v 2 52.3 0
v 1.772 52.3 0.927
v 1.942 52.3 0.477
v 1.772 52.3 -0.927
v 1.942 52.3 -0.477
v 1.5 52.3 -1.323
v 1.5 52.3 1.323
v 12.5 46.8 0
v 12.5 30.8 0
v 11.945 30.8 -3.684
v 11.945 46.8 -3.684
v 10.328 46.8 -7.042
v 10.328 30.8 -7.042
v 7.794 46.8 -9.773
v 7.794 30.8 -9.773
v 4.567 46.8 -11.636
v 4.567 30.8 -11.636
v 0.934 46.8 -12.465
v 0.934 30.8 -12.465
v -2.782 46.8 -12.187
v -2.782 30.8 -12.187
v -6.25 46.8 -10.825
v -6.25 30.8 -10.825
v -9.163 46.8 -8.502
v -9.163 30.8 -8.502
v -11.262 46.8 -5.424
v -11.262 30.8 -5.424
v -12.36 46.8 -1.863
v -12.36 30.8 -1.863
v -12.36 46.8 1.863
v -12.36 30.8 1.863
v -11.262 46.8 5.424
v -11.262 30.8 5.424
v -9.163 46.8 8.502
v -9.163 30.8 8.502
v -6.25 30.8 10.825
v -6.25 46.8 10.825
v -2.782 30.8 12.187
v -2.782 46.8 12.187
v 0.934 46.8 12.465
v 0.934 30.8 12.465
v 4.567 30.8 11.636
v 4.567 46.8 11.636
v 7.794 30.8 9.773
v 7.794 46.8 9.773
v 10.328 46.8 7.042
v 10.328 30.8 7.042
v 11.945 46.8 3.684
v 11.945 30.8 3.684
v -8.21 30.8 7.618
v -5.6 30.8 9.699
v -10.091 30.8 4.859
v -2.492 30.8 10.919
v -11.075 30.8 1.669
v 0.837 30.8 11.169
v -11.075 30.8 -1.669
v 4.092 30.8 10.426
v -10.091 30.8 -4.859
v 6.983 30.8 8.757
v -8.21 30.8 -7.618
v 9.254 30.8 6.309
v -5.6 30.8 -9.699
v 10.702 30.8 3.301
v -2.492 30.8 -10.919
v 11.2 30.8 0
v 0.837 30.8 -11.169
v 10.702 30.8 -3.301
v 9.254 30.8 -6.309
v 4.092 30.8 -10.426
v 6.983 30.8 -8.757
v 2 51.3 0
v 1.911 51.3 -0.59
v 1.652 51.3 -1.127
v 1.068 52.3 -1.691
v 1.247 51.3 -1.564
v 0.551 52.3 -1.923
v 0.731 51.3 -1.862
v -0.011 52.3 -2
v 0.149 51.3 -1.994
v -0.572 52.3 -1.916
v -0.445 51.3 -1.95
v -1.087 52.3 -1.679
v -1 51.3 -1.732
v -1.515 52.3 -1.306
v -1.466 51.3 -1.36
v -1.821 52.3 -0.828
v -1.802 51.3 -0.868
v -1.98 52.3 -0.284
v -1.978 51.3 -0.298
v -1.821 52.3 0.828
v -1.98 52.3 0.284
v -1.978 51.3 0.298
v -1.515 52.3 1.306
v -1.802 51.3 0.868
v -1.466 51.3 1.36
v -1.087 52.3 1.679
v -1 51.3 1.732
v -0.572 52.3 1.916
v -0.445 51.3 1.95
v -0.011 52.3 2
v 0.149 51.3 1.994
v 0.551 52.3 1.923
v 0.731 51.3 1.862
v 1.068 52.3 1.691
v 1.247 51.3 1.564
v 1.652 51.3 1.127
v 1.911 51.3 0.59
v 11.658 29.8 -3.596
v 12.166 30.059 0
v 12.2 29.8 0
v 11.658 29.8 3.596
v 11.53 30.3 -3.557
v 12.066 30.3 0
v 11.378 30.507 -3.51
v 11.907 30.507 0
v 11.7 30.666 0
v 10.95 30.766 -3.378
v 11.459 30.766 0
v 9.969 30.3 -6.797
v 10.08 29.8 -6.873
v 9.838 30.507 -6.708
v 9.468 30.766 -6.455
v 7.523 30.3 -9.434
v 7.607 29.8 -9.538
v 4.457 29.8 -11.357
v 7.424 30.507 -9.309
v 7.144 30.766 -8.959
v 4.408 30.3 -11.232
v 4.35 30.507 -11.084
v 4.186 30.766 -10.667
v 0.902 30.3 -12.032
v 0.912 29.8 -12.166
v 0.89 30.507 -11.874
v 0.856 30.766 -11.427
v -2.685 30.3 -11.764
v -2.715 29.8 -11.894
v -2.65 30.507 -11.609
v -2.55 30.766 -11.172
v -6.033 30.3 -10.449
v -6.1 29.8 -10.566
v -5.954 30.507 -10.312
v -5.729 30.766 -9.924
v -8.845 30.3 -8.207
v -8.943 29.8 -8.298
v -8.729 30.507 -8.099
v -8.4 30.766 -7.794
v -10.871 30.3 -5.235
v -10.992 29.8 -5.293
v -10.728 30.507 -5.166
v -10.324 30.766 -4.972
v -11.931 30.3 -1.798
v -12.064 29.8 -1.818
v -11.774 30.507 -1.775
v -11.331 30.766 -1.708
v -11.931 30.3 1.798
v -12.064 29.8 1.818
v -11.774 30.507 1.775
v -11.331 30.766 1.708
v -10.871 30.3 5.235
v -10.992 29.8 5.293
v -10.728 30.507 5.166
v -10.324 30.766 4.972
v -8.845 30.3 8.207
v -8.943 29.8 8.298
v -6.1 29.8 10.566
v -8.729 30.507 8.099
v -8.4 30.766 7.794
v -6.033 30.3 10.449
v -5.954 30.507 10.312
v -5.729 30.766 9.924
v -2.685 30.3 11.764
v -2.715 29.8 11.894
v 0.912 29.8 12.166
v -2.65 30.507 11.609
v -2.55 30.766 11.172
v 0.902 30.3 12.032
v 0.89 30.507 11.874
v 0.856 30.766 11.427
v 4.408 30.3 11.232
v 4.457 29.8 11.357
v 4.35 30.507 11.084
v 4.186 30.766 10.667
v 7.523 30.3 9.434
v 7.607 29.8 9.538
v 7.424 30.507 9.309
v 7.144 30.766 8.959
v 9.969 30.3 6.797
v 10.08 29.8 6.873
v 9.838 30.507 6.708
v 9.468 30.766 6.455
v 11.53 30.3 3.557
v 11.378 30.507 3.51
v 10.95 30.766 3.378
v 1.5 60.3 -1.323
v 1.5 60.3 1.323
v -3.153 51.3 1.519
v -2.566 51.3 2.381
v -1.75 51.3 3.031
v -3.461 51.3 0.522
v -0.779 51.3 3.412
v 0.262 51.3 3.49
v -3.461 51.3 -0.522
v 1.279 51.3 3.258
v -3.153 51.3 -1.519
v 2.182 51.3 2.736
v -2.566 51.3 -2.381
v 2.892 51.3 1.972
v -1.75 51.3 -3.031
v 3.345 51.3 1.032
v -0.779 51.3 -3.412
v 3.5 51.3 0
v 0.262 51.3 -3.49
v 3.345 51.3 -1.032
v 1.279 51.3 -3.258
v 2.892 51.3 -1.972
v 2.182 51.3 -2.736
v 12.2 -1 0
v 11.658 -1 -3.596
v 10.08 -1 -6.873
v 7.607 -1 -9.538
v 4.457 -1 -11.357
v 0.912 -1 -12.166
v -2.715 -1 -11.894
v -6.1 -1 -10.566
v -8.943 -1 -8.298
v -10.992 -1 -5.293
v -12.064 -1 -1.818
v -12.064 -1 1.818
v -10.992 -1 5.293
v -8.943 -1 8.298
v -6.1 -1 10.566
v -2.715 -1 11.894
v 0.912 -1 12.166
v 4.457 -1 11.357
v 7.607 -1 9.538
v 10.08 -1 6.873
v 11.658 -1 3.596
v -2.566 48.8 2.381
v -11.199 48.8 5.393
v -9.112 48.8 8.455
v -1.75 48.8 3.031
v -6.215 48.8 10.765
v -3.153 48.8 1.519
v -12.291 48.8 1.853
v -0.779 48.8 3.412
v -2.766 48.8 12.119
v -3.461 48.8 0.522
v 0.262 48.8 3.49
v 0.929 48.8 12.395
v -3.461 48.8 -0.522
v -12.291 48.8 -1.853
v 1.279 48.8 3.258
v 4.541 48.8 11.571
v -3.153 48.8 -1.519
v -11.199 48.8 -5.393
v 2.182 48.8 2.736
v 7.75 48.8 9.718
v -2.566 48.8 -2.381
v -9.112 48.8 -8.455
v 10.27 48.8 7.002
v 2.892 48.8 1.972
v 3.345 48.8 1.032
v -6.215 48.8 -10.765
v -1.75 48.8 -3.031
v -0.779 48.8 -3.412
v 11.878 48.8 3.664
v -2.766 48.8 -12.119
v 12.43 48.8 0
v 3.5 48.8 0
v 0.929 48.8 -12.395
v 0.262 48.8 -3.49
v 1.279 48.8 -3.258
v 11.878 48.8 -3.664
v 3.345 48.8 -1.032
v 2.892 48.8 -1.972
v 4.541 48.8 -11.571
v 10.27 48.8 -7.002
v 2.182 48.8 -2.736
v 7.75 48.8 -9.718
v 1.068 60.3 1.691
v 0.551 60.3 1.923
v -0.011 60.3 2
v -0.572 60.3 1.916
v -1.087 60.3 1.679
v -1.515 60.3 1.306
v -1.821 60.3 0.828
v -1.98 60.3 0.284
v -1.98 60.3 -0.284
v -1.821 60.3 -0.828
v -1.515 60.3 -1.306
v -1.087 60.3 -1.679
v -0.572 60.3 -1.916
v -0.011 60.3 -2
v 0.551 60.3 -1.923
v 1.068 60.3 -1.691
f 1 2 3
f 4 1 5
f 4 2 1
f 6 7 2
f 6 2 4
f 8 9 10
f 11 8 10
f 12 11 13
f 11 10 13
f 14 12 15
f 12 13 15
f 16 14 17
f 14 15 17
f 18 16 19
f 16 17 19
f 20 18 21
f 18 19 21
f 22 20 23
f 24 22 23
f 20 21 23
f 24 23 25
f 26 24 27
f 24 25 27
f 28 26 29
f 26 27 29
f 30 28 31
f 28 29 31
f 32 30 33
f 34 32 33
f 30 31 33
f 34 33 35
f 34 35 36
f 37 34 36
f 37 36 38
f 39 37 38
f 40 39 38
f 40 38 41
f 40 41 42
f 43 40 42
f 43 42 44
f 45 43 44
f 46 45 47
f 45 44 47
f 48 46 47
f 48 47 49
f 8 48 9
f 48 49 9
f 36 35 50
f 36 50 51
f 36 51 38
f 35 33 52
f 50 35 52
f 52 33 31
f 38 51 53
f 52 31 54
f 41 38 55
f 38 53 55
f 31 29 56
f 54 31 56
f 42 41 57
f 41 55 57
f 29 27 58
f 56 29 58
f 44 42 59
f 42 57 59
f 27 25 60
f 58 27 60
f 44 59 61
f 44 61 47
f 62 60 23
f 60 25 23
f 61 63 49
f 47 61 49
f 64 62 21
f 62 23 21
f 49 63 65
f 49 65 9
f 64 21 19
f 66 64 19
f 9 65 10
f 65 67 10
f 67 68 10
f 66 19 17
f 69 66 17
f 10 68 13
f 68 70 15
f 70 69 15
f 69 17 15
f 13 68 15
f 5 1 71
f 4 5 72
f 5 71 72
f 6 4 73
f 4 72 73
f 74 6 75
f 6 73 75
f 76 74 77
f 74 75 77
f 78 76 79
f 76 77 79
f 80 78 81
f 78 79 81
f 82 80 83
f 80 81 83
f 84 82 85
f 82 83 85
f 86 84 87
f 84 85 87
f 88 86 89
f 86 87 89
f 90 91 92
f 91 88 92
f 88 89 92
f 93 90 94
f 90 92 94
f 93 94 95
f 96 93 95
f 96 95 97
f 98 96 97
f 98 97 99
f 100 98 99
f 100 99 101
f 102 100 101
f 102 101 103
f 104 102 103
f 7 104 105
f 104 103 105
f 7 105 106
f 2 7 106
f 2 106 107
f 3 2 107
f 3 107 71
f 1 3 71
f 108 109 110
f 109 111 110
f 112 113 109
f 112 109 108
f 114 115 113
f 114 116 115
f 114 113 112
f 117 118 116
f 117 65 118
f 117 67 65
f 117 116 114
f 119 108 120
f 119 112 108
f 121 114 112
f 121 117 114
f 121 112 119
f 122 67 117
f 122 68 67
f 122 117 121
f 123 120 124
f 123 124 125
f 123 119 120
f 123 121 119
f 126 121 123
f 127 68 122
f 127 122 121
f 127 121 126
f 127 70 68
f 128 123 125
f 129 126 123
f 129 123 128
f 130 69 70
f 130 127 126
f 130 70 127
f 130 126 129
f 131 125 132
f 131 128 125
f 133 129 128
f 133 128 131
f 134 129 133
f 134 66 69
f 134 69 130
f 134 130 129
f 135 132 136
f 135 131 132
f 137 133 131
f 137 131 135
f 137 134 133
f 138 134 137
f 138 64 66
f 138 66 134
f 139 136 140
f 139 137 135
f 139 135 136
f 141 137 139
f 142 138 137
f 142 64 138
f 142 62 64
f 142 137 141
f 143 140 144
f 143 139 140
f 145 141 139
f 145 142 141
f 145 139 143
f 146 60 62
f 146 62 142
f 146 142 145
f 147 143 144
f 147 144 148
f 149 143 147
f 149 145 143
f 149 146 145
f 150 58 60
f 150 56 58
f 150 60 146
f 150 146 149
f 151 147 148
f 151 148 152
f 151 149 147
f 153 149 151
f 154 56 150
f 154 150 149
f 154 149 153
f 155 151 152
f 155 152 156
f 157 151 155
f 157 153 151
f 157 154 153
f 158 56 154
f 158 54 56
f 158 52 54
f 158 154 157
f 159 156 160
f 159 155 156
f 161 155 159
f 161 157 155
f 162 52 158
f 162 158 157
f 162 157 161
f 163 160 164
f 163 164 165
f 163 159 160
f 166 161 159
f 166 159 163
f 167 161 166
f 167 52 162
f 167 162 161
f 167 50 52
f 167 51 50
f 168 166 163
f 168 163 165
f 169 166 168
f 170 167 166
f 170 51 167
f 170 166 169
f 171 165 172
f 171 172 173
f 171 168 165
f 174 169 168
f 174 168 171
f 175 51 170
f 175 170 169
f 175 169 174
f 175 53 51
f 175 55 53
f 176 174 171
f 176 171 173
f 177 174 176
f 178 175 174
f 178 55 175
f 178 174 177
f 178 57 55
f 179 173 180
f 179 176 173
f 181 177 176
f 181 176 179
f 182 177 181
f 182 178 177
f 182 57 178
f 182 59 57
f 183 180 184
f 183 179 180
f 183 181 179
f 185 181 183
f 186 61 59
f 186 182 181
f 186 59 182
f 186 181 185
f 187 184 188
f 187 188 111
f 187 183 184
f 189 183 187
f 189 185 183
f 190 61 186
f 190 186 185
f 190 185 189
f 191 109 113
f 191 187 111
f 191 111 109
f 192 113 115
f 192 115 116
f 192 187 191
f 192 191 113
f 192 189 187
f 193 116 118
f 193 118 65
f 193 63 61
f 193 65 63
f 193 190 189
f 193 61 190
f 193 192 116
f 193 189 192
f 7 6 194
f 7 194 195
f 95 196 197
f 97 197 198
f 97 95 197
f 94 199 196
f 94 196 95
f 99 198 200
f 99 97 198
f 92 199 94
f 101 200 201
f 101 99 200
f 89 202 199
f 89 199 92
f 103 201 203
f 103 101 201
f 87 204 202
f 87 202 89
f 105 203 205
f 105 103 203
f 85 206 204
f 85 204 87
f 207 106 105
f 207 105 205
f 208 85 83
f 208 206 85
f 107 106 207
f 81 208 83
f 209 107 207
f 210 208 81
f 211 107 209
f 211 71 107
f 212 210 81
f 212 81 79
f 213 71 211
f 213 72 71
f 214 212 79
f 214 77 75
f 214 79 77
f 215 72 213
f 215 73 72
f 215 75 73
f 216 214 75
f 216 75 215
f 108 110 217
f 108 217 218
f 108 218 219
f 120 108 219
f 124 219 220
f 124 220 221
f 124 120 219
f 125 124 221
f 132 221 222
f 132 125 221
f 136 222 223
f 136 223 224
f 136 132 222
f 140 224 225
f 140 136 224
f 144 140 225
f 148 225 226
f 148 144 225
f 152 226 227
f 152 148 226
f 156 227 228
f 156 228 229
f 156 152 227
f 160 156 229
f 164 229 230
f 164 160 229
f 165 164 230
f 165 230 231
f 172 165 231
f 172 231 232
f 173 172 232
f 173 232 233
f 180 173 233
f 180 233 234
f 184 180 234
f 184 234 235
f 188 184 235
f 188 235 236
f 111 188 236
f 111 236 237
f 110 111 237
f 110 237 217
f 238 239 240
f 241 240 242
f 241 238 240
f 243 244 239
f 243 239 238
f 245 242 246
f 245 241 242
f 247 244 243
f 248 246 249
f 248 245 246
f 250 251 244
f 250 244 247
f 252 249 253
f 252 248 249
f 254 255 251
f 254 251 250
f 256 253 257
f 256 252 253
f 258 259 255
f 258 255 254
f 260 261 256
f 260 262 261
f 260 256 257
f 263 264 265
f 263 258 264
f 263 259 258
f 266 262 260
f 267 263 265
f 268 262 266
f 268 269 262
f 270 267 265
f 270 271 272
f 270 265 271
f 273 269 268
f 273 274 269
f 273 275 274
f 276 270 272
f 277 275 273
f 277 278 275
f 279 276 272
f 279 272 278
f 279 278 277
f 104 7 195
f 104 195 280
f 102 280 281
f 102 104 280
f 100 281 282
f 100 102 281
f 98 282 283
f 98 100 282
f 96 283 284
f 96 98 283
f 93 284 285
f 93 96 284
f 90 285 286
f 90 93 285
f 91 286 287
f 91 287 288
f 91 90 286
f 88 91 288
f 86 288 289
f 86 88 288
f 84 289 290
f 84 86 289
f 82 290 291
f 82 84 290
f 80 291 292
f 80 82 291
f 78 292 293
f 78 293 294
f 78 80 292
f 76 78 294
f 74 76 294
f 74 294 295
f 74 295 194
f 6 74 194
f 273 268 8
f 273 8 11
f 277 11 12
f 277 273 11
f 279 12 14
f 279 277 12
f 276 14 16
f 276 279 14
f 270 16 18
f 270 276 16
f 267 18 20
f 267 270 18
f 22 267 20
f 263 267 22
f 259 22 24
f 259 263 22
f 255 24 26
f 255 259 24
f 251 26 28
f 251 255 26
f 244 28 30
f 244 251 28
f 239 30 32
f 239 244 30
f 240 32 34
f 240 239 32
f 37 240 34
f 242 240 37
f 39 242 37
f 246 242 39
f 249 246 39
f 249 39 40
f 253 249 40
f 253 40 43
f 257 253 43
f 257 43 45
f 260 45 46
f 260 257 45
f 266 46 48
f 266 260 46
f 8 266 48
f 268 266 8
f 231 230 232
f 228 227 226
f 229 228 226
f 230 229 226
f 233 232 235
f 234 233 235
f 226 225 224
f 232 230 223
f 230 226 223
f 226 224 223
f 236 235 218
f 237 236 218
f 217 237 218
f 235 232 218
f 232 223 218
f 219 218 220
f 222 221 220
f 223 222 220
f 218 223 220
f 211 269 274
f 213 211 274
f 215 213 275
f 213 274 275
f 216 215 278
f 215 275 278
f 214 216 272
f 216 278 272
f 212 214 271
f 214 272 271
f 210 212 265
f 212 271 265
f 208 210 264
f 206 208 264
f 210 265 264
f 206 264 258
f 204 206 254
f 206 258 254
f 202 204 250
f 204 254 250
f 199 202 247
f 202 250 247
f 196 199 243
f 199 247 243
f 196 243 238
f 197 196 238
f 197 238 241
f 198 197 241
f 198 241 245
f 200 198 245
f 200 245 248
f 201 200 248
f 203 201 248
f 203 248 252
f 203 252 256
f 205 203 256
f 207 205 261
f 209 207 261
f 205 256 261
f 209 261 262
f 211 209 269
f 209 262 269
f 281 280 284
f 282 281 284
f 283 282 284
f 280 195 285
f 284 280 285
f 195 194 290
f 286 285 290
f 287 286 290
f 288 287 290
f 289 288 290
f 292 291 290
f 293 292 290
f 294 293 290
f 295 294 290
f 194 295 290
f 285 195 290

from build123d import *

# Parameters (mm, degrees)
SKETCH1_R                = 12.2
BOSS_EXTRUDE1_DEPTH      = 30.8
BOSS_EXTRUDE1_DEPTH_BACK = 1
FILLET2_R                = 1
SKETCH4_R                = 12.5
BOSS_EXTRUDE2_DEPTH      = 18
CHAMFER5_SIZE            = 2
CHAMFER5_SIZE2           = 0.069841539
SKETCH5_R                = 3.5
BOSS_EXTRUDE3_DEPTH      = 2.5
SKETCH6_R                = 2
BOSS_EXTRUDE4_DEPTH      = 1
BOSS_EXTRUDE6_DEPTH      = 8


with BuildPart() as part:
    # Sketch1 → Boss-Extrude1 (new body, two sides)
    with BuildSketch(Plane(origin=(0, 0, 0), x_dir=(1, 0, 0), z_dir=(0, 1, 0))) as boss_extrude1_sk:
        Circle(SKETCH1_R)
    extrude(amount=BOSS_EXTRUDE1_DEPTH)
    extrude(boss_extrude1_sk.sketch, amount=-BOSS_EXTRUDE1_DEPTH_BACK)

    # Fillet2
    fillet2_edges = [part.edges().sort_by_distance(p)[0] for p in [
        (-12.2, 30.8, 0),
    ]]
    fillet(fillet2_edges, radius=FILLET2_R)

    # Sketch4 → Boss-Extrude2 (add)
    with BuildSketch(Plane(origin=(0, 30.8, 0), x_dir=(1, 0, 0), z_dir=(0, 1, 0))):
        Circle(SKETCH4_R)
    extrude(amount=BOSS_EXTRUDE2_DEPTH)

    # Chamfer5
    chamfer5_edges = [part.edges().sort_by_distance(p)[0] for p in [
        (-12.5, 48.8, 0),
    ]]
    chamfer5_side = [part.faces().sort_by_distance(p)[0] for p in [
        (-12.5, 39.8, 0),
    ]]
    chamfer(chamfer5_edges, length=CHAMFER5_SIZE, length2=CHAMFER5_SIZE2, reference=chamfer5_side[0])

    # Sketch5 → Boss-Extrude3 (add)
    with BuildSketch(Plane(origin=(0, 48.8, 0), x_dir=(1, 0, 0), z_dir=(0, 1, 0))):
        Circle(SKETCH5_R)
    extrude(amount=BOSS_EXTRUDE3_DEPTH)

    # Sketch6 → Boss-Extrude4 (add)
    with BuildSketch(Plane(origin=(0, 51.3, 0), x_dir=(1, 0, 0), z_dir=(0, 1, 0))):
        Circle(SKETCH6_R)
    extrude(amount=BOSS_EXTRUDE4_DEPTH)

    # Sketch12 → Boss-Extrude6 (add)
    with BuildSketch(Plane(origin=(0, 52.3, 0), x_dir=(1, 0, 0), z_dir=(0, 1, 0))):
        with BuildLine():
            Line((1.5, 1.322875656), (1.5, -1.322875656))
            ThreePointArc((1.5, -1.322875656), (-2, 0), (1.5, 1.322875656))
        make_face()
    extrude(amount=BOSS_EXTRUDE6_DEPTH)


solid = part.part
